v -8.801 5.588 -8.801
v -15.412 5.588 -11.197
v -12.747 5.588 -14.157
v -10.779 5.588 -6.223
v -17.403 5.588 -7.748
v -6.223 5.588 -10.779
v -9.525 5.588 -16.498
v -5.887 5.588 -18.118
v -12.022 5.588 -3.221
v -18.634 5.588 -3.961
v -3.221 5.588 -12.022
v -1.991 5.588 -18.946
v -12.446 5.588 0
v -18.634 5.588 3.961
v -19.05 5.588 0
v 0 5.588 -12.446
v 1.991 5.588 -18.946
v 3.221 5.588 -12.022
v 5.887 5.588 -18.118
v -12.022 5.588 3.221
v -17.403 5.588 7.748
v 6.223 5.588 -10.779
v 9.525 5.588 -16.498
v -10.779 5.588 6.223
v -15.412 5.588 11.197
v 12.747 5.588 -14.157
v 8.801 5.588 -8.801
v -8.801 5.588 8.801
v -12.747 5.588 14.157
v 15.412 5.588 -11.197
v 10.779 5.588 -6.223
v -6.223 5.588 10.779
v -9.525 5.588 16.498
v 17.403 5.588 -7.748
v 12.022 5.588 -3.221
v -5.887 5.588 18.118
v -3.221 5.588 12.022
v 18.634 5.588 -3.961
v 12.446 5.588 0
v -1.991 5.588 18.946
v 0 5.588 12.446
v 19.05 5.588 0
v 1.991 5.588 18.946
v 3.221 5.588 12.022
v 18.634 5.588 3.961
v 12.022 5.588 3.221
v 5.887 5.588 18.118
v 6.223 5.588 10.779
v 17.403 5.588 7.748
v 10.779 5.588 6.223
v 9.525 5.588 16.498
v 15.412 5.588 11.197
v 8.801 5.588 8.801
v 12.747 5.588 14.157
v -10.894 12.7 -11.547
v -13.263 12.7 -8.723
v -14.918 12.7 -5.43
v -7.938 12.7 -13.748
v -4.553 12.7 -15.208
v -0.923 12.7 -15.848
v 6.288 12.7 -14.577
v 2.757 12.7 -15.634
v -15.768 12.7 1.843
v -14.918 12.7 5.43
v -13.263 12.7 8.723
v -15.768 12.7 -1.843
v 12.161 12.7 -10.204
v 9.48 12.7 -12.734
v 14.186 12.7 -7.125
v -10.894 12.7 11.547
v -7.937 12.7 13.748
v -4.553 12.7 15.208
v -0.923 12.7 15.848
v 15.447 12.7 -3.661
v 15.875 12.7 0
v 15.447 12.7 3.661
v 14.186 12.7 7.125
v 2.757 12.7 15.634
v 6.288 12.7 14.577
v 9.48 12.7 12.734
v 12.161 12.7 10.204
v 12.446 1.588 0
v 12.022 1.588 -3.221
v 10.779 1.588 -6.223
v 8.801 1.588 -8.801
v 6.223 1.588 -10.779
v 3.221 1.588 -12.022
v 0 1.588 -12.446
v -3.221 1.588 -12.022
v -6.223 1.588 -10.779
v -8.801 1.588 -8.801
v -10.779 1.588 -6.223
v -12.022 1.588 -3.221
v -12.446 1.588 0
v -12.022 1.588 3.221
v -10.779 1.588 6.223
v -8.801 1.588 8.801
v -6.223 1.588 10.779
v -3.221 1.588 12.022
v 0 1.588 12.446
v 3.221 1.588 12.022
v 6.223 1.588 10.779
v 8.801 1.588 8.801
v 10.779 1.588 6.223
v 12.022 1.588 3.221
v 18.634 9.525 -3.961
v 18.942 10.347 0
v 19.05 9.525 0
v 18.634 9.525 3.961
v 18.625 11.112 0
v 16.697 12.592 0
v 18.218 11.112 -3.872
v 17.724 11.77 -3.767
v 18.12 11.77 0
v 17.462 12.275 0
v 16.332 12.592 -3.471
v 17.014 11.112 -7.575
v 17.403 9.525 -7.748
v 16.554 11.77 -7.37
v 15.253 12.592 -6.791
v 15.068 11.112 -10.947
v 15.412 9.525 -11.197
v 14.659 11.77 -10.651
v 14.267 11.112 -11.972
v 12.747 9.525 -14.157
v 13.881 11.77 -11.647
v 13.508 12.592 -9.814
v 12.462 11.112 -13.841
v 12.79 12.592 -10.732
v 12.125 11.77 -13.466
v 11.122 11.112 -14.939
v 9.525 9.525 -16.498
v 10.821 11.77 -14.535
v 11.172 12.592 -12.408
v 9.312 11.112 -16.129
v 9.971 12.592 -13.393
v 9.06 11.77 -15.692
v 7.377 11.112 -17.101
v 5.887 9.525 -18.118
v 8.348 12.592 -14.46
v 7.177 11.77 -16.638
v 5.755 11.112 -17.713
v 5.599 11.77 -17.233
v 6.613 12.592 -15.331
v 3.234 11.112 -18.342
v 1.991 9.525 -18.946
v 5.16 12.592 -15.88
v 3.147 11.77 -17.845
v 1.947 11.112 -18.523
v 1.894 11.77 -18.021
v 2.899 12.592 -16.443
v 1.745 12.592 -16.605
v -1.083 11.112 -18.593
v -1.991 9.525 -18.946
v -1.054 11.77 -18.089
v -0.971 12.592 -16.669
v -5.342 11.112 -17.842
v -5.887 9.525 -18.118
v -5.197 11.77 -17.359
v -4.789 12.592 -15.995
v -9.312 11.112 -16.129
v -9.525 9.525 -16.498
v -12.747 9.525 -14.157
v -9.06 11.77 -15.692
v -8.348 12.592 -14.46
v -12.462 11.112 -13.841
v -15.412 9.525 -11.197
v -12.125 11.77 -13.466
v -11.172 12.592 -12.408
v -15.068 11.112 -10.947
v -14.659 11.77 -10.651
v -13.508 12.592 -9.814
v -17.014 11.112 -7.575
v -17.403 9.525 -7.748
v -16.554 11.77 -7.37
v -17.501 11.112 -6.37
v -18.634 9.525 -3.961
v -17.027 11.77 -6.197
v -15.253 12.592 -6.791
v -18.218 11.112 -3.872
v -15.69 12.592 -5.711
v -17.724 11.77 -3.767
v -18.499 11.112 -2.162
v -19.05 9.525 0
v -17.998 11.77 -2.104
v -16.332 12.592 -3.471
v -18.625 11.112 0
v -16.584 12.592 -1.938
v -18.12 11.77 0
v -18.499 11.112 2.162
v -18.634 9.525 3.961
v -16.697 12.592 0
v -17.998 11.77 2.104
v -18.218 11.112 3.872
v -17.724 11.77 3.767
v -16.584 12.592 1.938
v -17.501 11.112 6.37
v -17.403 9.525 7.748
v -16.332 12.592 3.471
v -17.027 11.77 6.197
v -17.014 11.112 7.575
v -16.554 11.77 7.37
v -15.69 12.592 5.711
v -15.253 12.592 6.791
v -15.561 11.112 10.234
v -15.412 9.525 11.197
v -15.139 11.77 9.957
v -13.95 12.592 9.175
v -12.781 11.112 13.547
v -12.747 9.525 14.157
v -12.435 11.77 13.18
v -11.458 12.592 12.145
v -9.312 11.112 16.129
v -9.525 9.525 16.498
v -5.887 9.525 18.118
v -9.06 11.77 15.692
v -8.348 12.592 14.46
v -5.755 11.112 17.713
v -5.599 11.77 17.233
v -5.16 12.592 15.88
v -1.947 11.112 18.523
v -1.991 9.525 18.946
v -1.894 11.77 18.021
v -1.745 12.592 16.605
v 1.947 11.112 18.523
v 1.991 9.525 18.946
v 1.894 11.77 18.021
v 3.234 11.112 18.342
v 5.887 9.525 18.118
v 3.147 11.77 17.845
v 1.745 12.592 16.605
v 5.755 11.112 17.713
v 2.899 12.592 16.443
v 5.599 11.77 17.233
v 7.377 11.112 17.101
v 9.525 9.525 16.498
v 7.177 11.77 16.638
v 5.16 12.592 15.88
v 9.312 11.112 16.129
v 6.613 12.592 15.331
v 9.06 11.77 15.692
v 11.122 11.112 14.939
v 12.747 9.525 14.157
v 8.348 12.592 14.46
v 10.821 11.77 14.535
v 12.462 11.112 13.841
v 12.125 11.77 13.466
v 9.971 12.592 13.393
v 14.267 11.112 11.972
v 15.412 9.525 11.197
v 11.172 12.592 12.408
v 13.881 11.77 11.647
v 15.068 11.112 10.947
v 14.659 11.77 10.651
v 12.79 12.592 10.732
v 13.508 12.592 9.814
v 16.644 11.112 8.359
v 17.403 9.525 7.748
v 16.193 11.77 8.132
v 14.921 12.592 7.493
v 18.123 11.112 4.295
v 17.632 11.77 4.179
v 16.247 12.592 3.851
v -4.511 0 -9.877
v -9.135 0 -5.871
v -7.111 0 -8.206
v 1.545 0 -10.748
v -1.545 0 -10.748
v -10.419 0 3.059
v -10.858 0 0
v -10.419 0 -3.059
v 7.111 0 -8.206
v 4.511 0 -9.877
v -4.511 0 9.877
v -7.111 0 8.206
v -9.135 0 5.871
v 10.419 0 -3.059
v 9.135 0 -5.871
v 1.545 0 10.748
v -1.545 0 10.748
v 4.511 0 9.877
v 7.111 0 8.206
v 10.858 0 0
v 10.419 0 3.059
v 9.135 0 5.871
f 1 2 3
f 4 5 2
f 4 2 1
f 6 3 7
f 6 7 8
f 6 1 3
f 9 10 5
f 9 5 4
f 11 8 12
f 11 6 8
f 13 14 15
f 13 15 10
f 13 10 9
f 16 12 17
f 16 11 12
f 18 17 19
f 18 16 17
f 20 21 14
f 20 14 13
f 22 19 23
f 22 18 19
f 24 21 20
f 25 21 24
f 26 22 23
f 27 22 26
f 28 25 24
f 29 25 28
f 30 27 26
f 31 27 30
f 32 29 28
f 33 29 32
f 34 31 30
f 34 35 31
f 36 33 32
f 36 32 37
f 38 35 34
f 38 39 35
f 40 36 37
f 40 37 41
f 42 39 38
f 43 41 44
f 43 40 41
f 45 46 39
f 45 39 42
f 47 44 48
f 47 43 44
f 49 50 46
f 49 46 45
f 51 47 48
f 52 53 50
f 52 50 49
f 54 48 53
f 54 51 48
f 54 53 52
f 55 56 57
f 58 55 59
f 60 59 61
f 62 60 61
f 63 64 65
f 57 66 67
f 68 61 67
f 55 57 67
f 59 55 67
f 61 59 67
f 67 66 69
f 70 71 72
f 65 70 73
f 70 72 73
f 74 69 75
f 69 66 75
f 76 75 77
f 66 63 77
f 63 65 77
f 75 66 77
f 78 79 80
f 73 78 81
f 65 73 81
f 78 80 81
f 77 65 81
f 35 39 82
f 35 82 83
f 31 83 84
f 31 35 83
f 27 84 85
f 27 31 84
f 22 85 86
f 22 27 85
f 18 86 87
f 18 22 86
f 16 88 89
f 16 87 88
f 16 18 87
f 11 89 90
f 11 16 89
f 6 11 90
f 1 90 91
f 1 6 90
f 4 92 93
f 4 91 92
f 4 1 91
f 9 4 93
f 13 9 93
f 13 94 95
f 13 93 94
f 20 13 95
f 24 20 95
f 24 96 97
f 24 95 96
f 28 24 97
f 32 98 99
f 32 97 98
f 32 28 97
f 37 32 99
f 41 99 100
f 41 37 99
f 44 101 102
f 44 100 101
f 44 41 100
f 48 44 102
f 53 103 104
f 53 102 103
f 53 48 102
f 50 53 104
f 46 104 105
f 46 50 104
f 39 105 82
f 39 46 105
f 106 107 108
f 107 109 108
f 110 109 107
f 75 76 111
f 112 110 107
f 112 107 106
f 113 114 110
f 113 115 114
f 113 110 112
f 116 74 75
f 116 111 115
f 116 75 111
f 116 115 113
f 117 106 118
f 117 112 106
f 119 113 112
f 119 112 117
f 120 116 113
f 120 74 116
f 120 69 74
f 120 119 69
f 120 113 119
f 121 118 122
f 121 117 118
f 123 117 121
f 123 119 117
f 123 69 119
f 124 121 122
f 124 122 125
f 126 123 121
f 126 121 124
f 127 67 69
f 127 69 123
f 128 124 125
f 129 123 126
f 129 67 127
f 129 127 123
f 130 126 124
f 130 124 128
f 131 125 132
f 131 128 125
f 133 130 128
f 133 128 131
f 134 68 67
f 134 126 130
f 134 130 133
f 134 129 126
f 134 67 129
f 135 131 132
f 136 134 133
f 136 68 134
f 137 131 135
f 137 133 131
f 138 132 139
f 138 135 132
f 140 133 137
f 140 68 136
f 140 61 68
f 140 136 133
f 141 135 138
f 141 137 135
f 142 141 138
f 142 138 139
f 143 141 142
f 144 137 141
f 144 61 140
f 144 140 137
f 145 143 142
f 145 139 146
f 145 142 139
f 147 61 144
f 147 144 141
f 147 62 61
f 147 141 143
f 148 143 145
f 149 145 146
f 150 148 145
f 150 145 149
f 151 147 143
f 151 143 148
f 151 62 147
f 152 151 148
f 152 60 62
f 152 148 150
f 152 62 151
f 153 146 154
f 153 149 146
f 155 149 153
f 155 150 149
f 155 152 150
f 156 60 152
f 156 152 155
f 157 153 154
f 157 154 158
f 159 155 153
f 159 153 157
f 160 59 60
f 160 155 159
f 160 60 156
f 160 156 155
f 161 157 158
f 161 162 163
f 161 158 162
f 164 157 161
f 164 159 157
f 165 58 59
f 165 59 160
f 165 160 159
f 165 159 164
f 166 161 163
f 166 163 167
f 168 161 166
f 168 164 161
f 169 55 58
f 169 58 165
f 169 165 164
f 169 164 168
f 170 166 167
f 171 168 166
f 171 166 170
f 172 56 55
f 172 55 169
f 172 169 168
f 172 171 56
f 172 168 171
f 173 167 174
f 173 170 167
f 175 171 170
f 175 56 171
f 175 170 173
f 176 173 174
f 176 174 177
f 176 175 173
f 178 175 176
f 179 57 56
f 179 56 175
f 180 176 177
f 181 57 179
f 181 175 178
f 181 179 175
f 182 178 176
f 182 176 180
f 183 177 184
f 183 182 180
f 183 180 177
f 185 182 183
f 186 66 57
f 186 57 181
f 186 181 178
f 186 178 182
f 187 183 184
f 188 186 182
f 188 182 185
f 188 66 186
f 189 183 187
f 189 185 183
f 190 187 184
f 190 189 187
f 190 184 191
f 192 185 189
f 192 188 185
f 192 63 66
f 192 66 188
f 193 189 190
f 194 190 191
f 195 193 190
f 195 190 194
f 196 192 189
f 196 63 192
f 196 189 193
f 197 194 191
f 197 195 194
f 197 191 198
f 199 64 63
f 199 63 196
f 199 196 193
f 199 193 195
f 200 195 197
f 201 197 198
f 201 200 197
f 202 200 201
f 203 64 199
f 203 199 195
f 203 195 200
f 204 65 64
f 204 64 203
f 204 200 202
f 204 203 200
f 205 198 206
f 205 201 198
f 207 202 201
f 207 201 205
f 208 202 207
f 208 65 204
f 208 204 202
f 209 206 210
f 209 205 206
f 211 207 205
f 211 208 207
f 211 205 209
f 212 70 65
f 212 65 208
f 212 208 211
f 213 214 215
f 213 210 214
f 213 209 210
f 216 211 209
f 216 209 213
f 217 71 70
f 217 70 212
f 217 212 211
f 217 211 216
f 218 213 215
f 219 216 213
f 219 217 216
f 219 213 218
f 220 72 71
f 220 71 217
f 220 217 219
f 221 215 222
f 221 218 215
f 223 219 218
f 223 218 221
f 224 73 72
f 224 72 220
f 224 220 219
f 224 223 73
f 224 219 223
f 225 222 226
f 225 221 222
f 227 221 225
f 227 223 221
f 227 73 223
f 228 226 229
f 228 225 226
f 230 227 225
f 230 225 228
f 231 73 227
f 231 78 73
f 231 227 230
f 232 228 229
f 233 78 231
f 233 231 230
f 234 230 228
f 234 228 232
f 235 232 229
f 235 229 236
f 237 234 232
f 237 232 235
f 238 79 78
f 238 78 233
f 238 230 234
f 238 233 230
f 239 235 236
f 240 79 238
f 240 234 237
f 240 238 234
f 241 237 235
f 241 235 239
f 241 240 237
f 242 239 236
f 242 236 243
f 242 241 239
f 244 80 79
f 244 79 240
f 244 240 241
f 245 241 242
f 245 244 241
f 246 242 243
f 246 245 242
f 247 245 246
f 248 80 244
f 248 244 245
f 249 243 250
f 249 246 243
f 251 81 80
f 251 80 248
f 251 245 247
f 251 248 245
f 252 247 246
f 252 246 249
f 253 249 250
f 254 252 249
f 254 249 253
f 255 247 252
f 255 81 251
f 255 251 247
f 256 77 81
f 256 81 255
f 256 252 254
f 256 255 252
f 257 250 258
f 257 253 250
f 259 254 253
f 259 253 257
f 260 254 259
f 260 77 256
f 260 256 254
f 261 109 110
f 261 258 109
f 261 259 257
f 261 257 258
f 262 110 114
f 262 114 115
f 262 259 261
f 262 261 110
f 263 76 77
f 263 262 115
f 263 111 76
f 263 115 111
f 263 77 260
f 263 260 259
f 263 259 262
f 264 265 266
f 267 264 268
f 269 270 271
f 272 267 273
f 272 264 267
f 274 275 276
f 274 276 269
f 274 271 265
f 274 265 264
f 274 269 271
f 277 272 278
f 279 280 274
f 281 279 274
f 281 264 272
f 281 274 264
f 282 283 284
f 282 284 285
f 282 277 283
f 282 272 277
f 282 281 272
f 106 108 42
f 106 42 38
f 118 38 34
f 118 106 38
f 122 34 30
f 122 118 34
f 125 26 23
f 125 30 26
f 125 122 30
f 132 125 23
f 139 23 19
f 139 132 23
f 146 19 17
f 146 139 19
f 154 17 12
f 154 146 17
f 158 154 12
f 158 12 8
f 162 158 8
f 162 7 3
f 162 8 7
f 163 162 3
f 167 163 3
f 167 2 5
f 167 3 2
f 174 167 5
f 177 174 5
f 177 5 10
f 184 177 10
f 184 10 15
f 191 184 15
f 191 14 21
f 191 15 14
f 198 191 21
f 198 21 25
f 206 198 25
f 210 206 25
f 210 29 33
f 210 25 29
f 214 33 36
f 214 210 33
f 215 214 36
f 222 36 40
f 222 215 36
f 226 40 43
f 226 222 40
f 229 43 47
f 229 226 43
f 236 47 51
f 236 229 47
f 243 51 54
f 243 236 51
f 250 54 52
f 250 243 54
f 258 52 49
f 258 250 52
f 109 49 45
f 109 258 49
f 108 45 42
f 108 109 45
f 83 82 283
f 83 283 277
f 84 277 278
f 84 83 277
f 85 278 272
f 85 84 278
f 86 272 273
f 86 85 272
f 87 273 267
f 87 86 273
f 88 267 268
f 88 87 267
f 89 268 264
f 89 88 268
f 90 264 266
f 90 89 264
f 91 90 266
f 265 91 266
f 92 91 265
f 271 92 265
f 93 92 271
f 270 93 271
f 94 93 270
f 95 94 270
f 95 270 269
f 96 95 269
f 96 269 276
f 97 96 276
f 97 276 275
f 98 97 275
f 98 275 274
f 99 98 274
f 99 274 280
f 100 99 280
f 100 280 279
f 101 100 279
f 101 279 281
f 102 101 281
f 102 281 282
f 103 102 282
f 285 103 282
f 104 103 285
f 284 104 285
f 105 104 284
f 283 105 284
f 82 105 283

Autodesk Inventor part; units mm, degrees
ref_plane "YZ Plane" through (0, 0, 0) normal (1, 0, 0) x (0, 1, 0)
ref_plane "XZ Plane" through (0, 0, 0) normal (0, 1, 0) x (-1, 0, 0)
ref_plane "XY Plane" through (0, 0, 0) normal (0, 0, 1) x (1, 0, 0)
sketch "Sketch1" plane through (0, 0, 0) normal (0, 0, 1) x (1, 0, 0)
  line L0 (0, 0) -> (12.446, 0)
  line L1 (12.446, 0) -> (12.446, 5.588)
  line L2 (12.446, 5.588) -> (0, 5.588)
  line L3 (0, 5.588) -> (0, 0)
  line L4 (0, 5.588) -> (19.05, 5.588)
  line L5 (19.05, 5.588) -> (19.05, 9.525)
  line L6 (15.875, 12.7) -> (0, 12.7)
  line L7 (0, 12.7) -> (0, 5.588)
  arc A0 (19.05, 9.525) -> (15.875, 12.7) centre (15.875, 9.525) ccw
  dimension "d0" = 12.446
  dimension "d1" = 5.588
  dimension "d2" = 19.05
  dimension "d3" = 12.7
  dimension "d4" = 3.175
revolve "Revolution1" add sketch "Sketch1" angle 360 about axis through (0, 5.588, 0) along (0, -1, 0)
chamfer "Chamfer1" distance 1.5875 angle 45 1 edges at (-12.446, 0, 0)
properties part number "2016.06.10 ps Hamamatsu PMT Adapter bung cover"
